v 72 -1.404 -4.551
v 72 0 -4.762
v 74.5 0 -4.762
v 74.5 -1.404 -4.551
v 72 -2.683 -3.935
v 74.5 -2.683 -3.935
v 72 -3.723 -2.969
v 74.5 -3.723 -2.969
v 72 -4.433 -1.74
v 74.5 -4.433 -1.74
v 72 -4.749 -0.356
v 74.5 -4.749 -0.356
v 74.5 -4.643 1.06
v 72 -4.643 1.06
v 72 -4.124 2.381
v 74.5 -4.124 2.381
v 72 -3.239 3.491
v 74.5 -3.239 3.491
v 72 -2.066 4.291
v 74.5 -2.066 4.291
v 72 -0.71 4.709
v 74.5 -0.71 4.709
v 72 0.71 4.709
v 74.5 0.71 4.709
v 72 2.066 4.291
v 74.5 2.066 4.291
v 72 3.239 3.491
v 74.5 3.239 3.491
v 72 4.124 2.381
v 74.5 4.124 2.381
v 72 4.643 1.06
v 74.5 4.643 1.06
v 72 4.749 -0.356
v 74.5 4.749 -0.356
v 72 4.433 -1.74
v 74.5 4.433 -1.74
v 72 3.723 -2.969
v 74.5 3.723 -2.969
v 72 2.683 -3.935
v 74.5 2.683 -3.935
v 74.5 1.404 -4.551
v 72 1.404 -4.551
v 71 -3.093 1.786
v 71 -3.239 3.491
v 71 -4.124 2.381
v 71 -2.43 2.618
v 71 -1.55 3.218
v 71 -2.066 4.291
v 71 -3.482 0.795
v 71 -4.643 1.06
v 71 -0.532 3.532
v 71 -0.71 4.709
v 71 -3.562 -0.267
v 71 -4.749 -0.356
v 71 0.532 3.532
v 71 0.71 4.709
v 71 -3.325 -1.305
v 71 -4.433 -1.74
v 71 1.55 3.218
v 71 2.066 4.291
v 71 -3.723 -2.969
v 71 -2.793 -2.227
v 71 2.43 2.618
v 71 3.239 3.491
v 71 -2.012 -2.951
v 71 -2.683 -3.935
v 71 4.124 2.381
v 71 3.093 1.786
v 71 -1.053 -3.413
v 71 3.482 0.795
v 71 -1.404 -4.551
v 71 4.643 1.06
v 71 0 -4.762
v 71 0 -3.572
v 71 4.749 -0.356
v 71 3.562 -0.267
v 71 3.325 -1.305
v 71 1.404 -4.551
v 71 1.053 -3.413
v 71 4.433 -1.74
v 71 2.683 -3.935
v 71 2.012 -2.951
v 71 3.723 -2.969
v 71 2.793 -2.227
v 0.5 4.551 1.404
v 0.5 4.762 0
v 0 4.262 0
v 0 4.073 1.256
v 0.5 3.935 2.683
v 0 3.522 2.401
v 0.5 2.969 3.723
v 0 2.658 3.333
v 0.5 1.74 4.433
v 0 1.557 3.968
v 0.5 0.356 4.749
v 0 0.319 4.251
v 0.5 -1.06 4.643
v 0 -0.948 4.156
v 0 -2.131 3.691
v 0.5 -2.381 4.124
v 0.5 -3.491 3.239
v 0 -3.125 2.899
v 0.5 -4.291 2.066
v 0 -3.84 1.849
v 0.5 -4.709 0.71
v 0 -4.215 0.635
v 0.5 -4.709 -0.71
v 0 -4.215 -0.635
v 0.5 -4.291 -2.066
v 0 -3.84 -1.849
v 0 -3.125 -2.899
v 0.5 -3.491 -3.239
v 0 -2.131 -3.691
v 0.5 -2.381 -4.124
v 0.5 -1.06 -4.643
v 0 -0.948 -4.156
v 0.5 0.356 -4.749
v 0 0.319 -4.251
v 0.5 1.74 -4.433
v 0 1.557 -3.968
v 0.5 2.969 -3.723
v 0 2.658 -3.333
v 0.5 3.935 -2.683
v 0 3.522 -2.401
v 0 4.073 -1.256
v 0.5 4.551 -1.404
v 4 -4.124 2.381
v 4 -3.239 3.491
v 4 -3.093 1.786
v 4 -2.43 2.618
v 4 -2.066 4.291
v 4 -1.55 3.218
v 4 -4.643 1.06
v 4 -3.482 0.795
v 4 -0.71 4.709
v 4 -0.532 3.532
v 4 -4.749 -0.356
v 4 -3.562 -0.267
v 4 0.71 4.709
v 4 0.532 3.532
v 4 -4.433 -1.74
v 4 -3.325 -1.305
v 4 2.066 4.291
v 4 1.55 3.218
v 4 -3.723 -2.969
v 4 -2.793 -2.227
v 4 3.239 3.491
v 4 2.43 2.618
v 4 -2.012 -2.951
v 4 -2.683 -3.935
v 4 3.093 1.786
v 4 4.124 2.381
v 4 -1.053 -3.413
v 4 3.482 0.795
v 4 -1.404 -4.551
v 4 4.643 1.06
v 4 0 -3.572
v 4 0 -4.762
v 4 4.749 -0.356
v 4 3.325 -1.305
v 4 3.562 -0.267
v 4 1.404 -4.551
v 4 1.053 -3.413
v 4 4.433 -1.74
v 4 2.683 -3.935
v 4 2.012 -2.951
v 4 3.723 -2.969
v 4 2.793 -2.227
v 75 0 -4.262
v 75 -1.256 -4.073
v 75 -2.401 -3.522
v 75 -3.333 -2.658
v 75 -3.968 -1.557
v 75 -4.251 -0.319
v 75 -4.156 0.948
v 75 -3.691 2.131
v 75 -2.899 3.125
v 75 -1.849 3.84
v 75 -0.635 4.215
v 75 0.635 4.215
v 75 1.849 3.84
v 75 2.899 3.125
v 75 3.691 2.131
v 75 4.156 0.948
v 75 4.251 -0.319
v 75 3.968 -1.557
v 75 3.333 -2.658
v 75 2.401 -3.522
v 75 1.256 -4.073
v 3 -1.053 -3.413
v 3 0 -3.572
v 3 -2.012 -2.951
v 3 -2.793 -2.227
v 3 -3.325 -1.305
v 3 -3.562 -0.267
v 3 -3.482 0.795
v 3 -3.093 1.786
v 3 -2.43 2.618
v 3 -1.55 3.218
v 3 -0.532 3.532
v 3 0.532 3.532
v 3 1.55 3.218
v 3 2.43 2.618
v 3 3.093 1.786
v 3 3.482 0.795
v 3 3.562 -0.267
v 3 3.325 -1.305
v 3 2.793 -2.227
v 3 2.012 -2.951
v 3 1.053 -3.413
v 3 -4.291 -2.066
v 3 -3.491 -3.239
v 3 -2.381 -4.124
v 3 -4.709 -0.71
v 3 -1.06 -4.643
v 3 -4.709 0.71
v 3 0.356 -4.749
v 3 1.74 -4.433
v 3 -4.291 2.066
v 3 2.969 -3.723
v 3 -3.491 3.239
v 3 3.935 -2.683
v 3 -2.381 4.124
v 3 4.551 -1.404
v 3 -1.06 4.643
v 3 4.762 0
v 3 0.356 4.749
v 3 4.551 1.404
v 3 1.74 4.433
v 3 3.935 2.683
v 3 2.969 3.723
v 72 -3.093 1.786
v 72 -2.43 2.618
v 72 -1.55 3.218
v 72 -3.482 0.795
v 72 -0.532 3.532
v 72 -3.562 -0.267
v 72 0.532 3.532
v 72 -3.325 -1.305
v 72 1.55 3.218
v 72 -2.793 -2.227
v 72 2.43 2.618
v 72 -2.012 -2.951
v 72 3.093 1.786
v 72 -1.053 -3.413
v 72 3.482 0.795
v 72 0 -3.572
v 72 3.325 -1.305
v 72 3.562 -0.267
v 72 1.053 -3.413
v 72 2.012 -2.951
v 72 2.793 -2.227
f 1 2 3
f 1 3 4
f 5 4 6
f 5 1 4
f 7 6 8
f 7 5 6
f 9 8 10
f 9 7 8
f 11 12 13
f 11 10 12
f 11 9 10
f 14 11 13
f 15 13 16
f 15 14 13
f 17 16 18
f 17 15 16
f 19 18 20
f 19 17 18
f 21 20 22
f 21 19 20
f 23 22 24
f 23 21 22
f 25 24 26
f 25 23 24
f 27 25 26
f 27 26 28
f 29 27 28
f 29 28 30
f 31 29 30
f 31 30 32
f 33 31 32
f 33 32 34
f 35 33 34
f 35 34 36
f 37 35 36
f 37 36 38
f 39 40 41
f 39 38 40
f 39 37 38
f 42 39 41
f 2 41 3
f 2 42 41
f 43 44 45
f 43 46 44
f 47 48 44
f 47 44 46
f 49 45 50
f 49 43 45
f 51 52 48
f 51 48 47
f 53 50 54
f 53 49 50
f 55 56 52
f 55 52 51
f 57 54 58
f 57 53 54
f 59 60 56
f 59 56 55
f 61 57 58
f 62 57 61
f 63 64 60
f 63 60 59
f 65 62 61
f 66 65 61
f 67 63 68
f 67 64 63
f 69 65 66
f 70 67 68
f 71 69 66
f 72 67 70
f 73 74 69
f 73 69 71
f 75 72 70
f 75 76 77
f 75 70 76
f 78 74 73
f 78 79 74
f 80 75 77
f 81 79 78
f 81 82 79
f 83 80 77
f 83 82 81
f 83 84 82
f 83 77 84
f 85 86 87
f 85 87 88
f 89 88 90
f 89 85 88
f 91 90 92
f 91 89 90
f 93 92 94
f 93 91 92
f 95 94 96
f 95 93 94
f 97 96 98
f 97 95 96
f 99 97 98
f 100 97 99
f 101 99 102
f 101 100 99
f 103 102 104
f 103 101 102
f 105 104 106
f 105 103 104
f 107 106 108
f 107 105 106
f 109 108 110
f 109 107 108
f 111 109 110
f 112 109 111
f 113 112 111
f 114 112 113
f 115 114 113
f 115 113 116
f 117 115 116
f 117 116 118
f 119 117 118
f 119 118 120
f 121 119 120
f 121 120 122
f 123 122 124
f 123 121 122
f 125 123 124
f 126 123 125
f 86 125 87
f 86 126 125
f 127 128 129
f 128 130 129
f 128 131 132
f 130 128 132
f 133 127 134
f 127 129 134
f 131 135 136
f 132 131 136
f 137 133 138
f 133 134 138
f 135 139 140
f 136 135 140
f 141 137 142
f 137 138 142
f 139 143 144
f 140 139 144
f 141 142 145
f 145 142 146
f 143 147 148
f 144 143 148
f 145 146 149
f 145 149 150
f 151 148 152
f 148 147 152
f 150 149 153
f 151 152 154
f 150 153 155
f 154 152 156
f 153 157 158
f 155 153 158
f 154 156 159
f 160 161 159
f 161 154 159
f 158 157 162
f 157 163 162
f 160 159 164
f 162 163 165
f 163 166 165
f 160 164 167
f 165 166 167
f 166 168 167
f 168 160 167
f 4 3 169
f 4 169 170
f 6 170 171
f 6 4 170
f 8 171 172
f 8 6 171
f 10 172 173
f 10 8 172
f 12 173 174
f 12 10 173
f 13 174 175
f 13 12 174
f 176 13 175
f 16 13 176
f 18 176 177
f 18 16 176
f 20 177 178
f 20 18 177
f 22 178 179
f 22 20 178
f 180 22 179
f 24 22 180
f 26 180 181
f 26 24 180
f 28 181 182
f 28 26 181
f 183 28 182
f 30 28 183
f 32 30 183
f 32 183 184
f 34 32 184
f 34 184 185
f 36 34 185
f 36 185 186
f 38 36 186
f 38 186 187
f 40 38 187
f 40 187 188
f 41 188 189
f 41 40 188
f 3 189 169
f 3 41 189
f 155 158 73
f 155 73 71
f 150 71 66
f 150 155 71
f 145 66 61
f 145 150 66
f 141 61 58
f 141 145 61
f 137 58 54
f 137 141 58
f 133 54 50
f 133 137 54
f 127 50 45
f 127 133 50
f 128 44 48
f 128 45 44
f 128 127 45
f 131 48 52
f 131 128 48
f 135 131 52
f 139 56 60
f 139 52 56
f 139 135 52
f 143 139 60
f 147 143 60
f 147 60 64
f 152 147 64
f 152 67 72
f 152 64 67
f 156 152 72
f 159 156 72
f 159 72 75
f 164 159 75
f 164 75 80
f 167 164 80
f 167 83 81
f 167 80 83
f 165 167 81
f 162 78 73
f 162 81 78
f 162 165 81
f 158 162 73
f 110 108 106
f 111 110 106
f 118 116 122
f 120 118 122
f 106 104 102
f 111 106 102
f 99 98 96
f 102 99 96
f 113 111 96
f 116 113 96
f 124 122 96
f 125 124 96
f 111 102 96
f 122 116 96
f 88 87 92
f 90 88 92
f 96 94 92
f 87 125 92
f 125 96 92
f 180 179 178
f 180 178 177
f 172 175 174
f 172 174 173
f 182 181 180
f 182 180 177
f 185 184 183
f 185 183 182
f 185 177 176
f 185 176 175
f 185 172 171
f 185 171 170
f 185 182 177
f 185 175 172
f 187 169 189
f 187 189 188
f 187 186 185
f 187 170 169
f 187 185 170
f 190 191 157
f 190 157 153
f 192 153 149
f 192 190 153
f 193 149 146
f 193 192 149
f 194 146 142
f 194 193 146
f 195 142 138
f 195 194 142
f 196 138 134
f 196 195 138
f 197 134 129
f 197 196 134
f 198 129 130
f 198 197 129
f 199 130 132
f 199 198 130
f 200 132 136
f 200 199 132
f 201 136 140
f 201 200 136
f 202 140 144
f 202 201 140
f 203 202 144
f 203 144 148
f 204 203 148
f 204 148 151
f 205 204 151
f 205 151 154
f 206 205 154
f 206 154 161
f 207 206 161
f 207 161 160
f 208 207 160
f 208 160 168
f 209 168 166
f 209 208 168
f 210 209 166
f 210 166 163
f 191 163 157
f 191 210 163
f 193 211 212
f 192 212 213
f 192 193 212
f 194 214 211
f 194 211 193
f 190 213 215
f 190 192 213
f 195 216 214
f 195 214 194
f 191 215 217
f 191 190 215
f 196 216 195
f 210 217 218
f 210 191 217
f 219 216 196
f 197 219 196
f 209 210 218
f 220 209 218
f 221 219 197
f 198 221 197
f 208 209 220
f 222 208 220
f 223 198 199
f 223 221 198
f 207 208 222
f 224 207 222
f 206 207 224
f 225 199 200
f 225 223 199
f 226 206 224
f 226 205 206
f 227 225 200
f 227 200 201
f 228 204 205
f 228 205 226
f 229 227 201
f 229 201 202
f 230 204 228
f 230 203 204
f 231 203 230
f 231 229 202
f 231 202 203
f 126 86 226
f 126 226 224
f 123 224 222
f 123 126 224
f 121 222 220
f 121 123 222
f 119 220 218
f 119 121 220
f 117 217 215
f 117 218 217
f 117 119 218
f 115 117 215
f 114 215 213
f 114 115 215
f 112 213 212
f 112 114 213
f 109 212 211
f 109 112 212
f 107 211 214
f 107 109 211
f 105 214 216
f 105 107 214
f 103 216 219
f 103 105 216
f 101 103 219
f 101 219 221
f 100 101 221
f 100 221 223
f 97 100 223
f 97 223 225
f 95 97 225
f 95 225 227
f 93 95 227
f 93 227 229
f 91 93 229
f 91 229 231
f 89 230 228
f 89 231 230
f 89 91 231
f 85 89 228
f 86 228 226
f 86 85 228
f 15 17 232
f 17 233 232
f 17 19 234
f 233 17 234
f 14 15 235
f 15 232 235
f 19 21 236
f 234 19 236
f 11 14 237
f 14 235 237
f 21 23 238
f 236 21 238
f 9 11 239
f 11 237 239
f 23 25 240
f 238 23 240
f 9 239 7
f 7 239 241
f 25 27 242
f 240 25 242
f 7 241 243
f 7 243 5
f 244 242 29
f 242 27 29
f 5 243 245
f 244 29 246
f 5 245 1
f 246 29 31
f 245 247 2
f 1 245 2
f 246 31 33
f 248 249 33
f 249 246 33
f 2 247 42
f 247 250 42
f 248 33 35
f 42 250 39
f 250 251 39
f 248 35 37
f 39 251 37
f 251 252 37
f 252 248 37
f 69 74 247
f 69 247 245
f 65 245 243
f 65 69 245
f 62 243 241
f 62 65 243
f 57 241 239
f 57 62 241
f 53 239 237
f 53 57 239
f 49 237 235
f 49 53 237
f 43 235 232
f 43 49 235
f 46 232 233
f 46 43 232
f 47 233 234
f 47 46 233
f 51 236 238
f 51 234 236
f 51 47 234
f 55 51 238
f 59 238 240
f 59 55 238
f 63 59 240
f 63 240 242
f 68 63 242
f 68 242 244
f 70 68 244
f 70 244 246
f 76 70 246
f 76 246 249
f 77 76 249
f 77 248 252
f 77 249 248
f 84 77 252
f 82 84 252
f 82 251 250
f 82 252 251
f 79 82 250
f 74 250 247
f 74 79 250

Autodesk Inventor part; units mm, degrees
ref_plane "YZ Plane" through (0, 0, 0) normal (1, 0, 0) x (0, 1, 0)
ref_plane "XZ Plane" through (0, 0, 0) normal (0, 1, 0) x (-1, 0, 0)
ref_plane "XY Plane" through (0, 0, 0) normal (0, 0, 1) x (1, 0, 0)
sketch "Esboço2" plane through (0, 0, 0) normal (1, 0, 0) x (0, 1, 0)
  circle A0 centre (0, 0) radius 4.7625
  dimension "d0" = 9.525
extrude "Extrusão1" add sketch "Esboço2" along normal blind 3
sketch "Esboço3" plane through (3, 0, 0) normal (1, 0, 0) x (0, 0, -1)
  circle A0 centre (0, 0) radius 4.7625 projected
  circle A1 centre (0, 0) radius 3.5719
  dimension "d3" = 7.1437
extrude "Extrusão2" add sketch "Esboço3" along normal blind 1 contours A1
sketch "Esboço4" plane through (4, 0, 0) normal (1, 0, 0) x (0, 0, -1)
  circle A0 centre (0, 0) radius 3.5719 projected
  circle A1 centre (0, 0) radius 4.7625
  dimension "d6" = 9.525
extrude "Extrusão3" add sketch "Esboço4" along normal blind 67 contours A0 | A1
sketch "Esboço5" plane through (71, 0, 0) normal (1, 0, 0) x (0, 0, -1)
  circle A0 centre (0, 0) radius 4.7625 projected
  circle A1 centre (0, 0) radius 3.5719
  dimension "d9" = 7.1437
extrude "Extrusão4" add sketch "Esboço5" along normal blind 1 contours A1
sketch "Esboço6" plane through (72, 0, 0) normal (1, 0, 0) x (0, 0, -1)
  circle A0 centre (0, 0) radius 3.5719 projected
  circle A1 centre (0, 0) radius 4.7625
  dimension "d12" = 9.525
extrude "Extrusão5" add sketch "Esboço6" along normal blind 3 contours A0 | A1
chamfer "Chanfro1" distance 0.5 angle 45 2 edges at (0, -4.7625, 0) (75, 0, 4.7625)
properties part number "pino_a3" material "Aço carbono"
